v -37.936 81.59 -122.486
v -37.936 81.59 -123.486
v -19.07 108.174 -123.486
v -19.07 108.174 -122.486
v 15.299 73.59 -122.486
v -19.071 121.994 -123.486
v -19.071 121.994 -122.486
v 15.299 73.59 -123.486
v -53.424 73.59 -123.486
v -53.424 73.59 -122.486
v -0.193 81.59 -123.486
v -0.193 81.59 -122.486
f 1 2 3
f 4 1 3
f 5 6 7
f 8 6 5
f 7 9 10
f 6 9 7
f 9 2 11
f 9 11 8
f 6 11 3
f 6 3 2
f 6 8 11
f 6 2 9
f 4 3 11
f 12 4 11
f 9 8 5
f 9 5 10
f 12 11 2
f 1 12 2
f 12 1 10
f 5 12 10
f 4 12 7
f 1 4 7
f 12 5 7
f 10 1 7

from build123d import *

# Parameters (mm, degrees)
EXTRUSION007_DEPTH = 57.9662962441
EXTRUSION006_DEPTH = 1


with BuildPart() as extrusion007:
    # Wire001 → Extrusion007 (new body)
    with BuildSketch(Plane(origin=(-19.0696986475, 108.1739584895, -123.4863420229), x_dir=(1, 0, 0), z_dir=(0, 0, -1))):
        Polygon((0, 0), (18.8765567724, 26.5836913795), (-18.8667640129, 26.5836945158), align=None)
    extrude(amount=-EXTRUSION007_DEPTH)


with BuildPart() as cut:
    # Wire → Extrusion006 (new body)
    with BuildSketch(Plane(origin=(15.2992136515, 73.5902667511, -123.4863420229), x_dir=(1, 0, 0), z_dir=(0, 0, 1))):
        Polygon((0, 0), (-68.7233756416, 0), (-34.3706052198, 48.4038255867), align=None)
    extrude(amount=EXTRUSION006_DEPTH)

    # Cut: cut Extrusion007
    add(extrusion007.part, mode=Mode.SUBTRACT)


solid = cut.part
